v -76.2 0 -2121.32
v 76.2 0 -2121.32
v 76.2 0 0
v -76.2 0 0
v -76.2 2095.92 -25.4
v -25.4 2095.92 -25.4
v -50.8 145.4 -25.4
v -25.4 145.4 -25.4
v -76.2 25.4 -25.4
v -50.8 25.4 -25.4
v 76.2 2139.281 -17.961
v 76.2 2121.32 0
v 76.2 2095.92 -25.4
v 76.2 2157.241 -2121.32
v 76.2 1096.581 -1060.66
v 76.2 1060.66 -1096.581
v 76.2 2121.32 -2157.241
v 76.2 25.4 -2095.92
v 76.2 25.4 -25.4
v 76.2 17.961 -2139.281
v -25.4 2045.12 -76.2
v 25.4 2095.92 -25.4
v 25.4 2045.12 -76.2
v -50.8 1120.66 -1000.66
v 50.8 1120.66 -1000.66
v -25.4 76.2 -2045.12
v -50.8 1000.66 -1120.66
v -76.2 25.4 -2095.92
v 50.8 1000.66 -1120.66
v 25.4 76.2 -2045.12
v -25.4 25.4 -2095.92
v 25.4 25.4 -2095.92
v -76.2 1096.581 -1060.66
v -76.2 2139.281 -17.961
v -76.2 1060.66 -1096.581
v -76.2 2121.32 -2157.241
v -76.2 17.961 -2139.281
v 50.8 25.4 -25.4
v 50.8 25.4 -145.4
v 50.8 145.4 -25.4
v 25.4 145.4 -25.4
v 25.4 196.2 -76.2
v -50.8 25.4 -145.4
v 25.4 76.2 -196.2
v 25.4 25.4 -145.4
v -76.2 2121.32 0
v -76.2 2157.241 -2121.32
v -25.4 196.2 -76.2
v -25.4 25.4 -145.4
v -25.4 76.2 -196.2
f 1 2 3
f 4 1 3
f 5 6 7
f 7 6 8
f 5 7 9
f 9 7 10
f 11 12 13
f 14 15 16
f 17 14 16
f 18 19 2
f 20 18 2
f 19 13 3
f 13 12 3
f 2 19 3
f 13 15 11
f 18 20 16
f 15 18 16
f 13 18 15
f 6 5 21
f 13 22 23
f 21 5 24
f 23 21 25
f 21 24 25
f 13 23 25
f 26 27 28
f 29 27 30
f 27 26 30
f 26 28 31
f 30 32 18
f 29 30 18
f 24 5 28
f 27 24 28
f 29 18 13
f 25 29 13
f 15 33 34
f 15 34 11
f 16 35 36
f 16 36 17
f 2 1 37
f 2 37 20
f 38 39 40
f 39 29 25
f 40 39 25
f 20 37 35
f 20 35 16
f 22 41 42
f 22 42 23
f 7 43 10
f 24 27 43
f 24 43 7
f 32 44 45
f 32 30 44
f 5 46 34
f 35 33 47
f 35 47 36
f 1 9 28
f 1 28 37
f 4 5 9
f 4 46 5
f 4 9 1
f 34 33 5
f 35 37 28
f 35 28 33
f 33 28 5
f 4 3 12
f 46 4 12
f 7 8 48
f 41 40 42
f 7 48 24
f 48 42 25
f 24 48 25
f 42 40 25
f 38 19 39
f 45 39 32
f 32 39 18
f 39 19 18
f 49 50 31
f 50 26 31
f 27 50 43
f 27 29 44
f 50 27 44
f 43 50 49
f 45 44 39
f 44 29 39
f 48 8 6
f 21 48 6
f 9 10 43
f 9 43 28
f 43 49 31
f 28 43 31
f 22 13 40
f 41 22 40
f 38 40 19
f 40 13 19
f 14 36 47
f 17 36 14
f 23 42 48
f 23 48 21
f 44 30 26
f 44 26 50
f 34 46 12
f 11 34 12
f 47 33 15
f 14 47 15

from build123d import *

# Parameters (mm, degrees)
EXTRUDE_2_DEPTH      = 76.2
EXTRUDE_2_DEPTH_BACK = 76.2
EXTRUDE_3_DEPTH      = 25.4
EXTRUDE_3_DEPTH_BACK = 25.4
SKETCH_4_W           = 152.4
SKETCH_4_H           = 2999.999514134
EXTRUDE_4_DEPTH      = 25.4
EXTRUDE_5_DEPTH      = 25.4
EXTRUDE_5_DEPTH_BACK = 76.2
SKETCH_6_W           = 152.4
SKETCH_6_H           = 50.8
EXTRUDE_6_DEPTH      = 1500


with BuildPart() as part:
    # 草图1 → 凸台-拉伸2 (new, two sides: drawn at the far end of the back side and taken through both)
    with BuildSketch(Plane(origin=(0, 0, 0), x_dir=(0, 0, -1), z_dir=(1, 0, 0)).offset(-EXTRUDE_2_DEPTH_BACK)):
        Polygon((0, 0), (0, 2121.32), (25.4, 2095.92), (25.4, 25.4), (2095.92, 25.4), (2121.32, 0), align=None)
    extrude(amount=EXTRUDE_2_DEPTH + EXTRUDE_2_DEPTH_BACK)

    # 草图3 → 凸台-拉伸3 (add, two sides: drawn at the far end of the back side and taken through both)
    with BuildSketch(Plane(origin=(0, 0, 0), x_dir=(0, 0, -1), z_dir=(1, 0, 0)).offset(-EXTRUDE_3_DEPTH_BACK)):
        Polygon((25.4, 2095.92), (25.4, 25.4), (2095.92, 25.4), (2045.12, 76.2), (76.2, 76.2), (76.2, 2045.12), align=None)
    extrude(amount=EXTRUDE_3_DEPTH + EXTRUDE_3_DEPTH_BACK)

    # 草图4 → 凸台-拉伸4 (add)
    with BuildSketch(Plane(origin=(0, 1060.66, -1060.66), x_dir=(1, 0, 0), z_dir=(0, 0.7071067811865493, -0.7071067811865457))):
        Rectangle(SKETCH_4_W, SKETCH_4_H)
    extrude(amount=EXTRUDE_4_DEPTH)

    # 草图5 → 凸台-拉伸5 (add, two sides: drawn at the far end of the back side and taken through both)
    with BuildSketch(Plane(origin=(25.4, 0, 0), x_dir=(0, 0, -1), z_dir=(1, 0, 0)).offset(-EXTRUDE_5_DEPTH_BACK)):
        Polygon((25.4, 25.4), (25.4, 145.4), (1000.66, 1120.66), (1120.66, 1000.66), (145.4, 25.4), align=None)
    extrude(amount=EXTRUDE_5_DEPTH + EXTRUDE_5_DEPTH_BACK)

    # 草图6 → 凸台-拉伸6 (add)
    with BuildSketch(Plane(origin=(0, 1078.620512242, -1078.620512242), x_dir=(1, 0, 0), z_dir=(0, 0.7071067811865495, -0.7071067811865457))):
        Rectangle(SKETCH_6_W, SKETCH_6_H)
    extrude(amount=EXTRUDE_6_DEPTH)


solid = part.part
